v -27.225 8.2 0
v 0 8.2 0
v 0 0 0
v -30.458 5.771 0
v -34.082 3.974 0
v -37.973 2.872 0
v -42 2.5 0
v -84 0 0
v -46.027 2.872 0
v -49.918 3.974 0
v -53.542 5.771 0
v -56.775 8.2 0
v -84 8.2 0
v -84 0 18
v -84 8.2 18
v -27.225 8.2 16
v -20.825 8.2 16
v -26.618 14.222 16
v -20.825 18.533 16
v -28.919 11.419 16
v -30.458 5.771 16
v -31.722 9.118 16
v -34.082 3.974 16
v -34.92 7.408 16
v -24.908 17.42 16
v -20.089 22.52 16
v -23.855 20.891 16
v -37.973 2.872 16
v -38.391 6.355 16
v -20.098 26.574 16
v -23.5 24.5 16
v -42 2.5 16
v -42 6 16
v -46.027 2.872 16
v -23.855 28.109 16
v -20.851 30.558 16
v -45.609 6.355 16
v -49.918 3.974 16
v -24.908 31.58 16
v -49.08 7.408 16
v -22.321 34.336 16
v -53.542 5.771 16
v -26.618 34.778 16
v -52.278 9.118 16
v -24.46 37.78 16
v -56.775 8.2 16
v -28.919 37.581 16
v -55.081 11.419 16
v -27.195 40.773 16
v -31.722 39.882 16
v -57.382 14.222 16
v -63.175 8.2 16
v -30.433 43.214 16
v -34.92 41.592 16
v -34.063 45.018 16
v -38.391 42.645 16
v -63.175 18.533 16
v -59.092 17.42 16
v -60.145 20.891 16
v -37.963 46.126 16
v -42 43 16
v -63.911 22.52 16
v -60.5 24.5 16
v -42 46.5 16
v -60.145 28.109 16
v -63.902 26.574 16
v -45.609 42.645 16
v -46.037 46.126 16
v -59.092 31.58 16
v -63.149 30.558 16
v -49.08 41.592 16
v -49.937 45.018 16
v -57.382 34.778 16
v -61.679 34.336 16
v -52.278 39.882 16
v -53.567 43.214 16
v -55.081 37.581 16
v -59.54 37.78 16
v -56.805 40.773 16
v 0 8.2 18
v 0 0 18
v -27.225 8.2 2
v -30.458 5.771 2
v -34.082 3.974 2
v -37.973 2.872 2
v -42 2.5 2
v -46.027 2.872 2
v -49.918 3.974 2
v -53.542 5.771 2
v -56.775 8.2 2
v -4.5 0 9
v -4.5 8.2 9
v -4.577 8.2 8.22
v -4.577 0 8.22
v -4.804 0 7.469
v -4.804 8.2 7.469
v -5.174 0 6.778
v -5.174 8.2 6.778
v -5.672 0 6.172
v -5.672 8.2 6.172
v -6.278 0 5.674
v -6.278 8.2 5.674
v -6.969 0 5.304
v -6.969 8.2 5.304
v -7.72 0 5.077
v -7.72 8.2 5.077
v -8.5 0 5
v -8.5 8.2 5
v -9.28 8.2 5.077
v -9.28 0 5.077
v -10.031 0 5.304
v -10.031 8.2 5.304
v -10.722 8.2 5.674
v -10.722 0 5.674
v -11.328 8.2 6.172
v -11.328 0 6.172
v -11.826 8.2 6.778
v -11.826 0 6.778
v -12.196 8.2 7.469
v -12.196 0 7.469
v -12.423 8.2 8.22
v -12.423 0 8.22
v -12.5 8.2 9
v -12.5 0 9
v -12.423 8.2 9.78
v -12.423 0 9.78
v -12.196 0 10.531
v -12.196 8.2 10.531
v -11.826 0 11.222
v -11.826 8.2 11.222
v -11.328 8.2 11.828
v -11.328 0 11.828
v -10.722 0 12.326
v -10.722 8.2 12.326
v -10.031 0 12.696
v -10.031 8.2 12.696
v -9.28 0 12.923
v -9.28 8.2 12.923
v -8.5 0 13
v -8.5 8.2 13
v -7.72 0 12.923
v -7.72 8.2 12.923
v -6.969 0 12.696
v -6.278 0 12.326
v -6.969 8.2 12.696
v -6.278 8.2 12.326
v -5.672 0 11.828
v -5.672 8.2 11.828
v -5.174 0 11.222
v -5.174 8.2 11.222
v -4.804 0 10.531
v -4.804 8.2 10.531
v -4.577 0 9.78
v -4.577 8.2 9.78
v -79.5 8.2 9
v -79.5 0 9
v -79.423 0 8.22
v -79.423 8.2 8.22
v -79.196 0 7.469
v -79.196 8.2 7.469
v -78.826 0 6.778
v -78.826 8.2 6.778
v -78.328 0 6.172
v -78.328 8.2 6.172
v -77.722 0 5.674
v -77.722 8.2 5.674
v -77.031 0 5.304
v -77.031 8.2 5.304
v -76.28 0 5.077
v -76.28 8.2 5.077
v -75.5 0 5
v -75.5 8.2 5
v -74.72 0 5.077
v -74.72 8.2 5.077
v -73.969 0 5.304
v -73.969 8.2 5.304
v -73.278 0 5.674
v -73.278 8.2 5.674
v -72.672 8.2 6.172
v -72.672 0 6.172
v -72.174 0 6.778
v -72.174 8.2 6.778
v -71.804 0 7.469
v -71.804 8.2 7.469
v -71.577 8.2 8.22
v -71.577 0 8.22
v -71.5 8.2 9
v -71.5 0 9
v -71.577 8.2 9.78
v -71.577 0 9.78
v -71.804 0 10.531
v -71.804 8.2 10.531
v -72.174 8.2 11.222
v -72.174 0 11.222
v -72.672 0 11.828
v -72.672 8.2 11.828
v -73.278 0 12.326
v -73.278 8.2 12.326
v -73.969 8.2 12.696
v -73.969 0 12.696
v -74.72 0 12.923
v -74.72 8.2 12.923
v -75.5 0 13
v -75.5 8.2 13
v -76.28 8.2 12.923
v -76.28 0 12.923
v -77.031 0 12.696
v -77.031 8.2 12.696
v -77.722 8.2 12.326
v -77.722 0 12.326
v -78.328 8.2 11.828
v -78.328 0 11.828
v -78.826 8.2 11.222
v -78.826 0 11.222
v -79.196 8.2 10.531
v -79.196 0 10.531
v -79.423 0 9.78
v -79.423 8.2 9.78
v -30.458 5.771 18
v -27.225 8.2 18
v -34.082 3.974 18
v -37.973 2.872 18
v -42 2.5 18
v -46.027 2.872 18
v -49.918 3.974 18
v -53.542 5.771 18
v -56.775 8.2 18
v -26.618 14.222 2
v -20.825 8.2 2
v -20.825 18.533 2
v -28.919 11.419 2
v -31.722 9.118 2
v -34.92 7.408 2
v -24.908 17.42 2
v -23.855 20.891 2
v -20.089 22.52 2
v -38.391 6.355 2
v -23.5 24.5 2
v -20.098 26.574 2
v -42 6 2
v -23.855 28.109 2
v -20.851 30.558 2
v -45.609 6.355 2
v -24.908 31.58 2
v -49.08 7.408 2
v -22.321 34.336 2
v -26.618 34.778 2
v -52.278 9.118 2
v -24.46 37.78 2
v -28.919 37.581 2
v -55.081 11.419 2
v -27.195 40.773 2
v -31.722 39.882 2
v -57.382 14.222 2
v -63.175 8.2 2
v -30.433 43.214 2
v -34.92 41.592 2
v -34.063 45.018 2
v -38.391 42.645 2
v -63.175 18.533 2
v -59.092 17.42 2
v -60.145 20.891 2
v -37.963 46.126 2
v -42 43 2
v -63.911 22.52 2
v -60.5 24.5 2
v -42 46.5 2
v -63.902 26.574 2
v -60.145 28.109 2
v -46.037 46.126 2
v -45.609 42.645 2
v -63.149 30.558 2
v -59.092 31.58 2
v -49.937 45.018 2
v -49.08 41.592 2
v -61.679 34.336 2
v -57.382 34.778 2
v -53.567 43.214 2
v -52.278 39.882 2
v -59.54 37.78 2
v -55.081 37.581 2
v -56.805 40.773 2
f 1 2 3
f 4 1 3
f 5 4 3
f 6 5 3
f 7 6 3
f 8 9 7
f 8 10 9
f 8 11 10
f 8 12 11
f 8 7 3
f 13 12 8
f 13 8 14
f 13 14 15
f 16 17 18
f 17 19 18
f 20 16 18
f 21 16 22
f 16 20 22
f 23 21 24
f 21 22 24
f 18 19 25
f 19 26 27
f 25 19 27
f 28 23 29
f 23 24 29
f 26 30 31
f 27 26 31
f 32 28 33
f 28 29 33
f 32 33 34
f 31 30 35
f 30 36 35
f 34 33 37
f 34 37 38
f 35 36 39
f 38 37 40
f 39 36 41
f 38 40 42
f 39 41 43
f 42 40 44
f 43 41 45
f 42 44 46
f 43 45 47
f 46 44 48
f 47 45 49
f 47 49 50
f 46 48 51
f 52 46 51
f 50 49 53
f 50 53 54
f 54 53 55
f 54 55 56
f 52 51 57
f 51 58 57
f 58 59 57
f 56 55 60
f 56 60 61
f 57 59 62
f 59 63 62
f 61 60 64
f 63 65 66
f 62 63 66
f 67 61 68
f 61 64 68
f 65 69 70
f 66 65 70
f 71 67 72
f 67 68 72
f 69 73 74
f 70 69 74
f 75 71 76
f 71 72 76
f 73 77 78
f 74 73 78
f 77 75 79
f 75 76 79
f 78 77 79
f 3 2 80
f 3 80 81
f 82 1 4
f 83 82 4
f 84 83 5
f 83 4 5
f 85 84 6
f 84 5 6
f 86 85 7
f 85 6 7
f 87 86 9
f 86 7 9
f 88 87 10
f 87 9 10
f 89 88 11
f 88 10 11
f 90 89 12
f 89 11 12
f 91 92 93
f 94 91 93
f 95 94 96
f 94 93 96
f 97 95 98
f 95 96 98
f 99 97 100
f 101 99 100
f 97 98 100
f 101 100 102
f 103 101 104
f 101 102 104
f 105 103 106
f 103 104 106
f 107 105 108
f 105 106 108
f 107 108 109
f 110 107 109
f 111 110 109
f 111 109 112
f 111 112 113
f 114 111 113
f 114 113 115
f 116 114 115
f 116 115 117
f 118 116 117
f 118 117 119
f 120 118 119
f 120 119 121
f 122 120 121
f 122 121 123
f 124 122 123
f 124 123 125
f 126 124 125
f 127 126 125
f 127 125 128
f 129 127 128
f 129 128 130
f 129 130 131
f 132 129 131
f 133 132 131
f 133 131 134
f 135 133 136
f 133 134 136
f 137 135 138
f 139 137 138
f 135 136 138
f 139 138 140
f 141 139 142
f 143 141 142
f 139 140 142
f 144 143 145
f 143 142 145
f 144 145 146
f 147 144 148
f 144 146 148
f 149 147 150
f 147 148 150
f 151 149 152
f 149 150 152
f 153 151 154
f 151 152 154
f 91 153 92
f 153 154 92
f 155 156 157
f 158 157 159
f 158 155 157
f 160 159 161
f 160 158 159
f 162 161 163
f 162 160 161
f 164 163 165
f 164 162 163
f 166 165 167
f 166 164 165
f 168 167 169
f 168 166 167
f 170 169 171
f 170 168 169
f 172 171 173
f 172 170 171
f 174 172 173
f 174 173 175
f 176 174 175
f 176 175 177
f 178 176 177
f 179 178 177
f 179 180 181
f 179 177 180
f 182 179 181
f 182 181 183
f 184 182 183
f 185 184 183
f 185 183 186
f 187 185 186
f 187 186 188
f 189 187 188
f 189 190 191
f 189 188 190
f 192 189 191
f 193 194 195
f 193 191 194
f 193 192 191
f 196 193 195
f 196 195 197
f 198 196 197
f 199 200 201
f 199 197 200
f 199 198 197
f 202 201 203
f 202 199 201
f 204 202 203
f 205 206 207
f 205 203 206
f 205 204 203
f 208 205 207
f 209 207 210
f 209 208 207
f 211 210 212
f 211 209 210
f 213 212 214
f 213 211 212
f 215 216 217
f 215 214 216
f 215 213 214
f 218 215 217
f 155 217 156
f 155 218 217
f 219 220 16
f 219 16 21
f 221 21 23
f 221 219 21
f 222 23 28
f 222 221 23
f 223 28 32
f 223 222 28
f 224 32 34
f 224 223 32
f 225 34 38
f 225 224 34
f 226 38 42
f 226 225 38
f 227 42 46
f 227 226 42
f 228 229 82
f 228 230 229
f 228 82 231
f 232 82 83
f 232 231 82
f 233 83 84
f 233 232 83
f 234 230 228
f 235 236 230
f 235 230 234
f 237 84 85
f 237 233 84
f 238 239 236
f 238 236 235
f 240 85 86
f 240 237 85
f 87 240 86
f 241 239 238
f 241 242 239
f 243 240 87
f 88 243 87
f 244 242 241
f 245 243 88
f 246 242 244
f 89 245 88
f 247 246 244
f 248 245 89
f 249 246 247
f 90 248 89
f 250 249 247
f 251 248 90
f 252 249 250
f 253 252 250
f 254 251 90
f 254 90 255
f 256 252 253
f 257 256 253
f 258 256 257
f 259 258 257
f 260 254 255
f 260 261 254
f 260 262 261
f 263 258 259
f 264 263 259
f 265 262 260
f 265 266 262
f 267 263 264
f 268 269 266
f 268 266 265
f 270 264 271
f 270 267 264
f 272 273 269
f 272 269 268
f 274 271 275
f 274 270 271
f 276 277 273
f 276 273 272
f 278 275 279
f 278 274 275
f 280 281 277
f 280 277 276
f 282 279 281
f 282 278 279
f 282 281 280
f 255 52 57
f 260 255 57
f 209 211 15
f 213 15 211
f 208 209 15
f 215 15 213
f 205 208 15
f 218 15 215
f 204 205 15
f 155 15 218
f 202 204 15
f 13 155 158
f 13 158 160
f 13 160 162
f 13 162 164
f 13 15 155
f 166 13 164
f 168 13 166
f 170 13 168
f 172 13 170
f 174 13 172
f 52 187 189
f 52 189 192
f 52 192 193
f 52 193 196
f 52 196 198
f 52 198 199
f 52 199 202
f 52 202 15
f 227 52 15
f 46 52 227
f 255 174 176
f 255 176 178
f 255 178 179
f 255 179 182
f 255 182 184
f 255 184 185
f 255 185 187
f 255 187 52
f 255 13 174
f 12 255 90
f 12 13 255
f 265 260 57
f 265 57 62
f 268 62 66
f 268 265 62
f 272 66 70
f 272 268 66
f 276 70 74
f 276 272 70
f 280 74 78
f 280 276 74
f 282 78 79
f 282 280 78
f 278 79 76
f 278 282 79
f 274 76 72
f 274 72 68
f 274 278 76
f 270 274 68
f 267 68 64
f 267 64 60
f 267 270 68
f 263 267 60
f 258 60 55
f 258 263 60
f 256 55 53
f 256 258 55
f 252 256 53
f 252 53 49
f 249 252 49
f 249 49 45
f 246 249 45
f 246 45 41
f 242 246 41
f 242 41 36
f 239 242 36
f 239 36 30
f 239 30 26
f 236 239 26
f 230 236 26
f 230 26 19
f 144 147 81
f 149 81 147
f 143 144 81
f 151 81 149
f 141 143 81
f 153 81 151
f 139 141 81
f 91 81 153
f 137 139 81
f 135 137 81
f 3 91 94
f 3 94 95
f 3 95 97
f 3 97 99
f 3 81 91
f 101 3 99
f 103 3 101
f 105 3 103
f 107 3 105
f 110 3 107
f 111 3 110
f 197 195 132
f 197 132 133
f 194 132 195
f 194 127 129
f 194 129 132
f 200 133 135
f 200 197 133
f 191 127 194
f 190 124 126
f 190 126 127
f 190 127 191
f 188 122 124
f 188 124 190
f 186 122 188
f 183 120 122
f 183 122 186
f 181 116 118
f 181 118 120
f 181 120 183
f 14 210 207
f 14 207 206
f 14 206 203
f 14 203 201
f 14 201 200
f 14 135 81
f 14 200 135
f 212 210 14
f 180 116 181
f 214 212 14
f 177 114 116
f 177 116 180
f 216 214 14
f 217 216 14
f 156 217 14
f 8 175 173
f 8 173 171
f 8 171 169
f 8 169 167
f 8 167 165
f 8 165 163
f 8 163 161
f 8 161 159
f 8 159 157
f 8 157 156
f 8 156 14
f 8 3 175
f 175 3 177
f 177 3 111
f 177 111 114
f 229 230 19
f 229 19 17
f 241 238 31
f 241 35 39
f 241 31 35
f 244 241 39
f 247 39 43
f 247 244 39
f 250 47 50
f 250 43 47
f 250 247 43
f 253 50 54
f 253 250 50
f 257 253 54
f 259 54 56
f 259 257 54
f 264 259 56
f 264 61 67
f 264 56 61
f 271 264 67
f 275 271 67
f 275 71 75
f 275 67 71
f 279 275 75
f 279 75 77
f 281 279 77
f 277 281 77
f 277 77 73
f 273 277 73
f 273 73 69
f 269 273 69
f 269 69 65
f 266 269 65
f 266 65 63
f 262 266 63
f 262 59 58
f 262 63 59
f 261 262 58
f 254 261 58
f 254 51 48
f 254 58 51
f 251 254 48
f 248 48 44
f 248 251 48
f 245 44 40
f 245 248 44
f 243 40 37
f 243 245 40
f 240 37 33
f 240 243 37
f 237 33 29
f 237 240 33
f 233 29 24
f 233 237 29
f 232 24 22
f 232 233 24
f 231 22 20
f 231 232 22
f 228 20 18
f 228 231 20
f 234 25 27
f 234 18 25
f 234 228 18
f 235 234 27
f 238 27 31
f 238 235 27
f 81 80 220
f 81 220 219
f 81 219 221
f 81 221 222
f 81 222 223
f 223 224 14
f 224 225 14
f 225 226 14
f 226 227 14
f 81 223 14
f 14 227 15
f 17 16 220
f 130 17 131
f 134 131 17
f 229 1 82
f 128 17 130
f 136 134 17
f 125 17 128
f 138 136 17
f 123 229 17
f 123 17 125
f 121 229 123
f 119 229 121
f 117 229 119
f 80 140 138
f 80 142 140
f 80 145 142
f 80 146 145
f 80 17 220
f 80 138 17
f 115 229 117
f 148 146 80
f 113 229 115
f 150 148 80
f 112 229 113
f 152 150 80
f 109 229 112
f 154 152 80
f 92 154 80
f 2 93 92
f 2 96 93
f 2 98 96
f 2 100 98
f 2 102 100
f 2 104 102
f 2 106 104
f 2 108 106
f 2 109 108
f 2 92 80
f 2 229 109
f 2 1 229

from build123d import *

# Parameters (mm, degrees)
CROQUIS1_R              = 18.5
SALIENTE_EXTRUIR1_DEPTH = 18
CROQUIS2_R              = 17.5
CORTAR_EXTRUIR1_DEPTH   = 2
CROQUIS3_R              = 4
CORTAR_EXTRUIR2_DEPTH   = 9.2


with BuildPart() as part:
    # Croquis1 → Saliente-Extruir1 (new body)
    with BuildSketch(Plane.XY):
        with BuildLine():
            Line((0, 0), (-84, 0))
            Line((-84, 0), (-84, 8.2))
            Line((-84, 8.2), (-63.175317255, 8.2))
            Line((-63.175317255, 8.2), (-63.175317255, 18.532928764))
            ThreePointArc((-63.175317255, 18.532928764), (-42, 46.5), (-20.824682745, 18.532928764))
            Line((-20.824682745, 18.532928764), (-20.824682745, 8.2))
            Line((-20.824682745, 8.2), (0, 8.2))
            Line((0, 8.2), (0, 0))
        make_face()
        with Locations((-42, 24.5)):
            Circle(CROQUIS1_R, mode=Mode.SUBTRACT)
    extrude(amount=SALIENTE_EXTRUIR1_DEPTH)

    # Croquis2 → Cortar-Extruir1 (cut)
    with BuildSketch(Plane.XY.offset(18)):
        with BuildLine():
            Line((-20.824682745, 8.2), (-27.224682745, 8.2))
            ThreePointArc((-27.224682745, 8.2), (-42, 2.5), (-56.775317255, 8.2))
            Line((-56.775317255, 8.2), (-63.175317255, 8.2))
            Line((-63.175317255, 8.2), (-63.175317255, 18.532928764))
            ThreePointArc((-63.175317255, 18.532928764), (-42, 46.5), (-20.824682745, 18.532928764))
            Line((-20.824682745, 18.532928764), (-20.824682745, 8.2))
        make_face()
        with Locations((-42, 24.5)):
            Circle(CROQUIS2_R, mode=Mode.SUBTRACT)
    cortar_extruir1 = extrude(amount=-CORTAR_EXTRUIR1_DEPTH, mode=Mode.SUBTRACT)

    # Simetría1: Cortar-Extruir1 across plane
    add(cortar_extruir1.mirror(Plane.XY.offset(9)), mode=Mode.SUBTRACT)

    # Croquis3 → Cortar-Extruir2 (cut, through all)
    with BuildSketch(Plane(origin=(0, 8.2, 0), x_dir=(1, 0, 0), z_dir=(0, 1, 0))):
        with Locations((-8.5, -9)):
            Circle(CROQUIS3_R)
    cortar_extruir2 = extrude(amount=-CORTAR_EXTRUIR2_DEPTH, mode=Mode.SUBTRACT)

    # Simetría2: Cortar-Extruir2 across plane
    add(cortar_extruir2.mirror(Plane(origin=(-42, 0, 0), x_dir=(0, 0, 1), z_dir=(1, 0, 0))), mode=Mode.SUBTRACT)


solid = part.part
